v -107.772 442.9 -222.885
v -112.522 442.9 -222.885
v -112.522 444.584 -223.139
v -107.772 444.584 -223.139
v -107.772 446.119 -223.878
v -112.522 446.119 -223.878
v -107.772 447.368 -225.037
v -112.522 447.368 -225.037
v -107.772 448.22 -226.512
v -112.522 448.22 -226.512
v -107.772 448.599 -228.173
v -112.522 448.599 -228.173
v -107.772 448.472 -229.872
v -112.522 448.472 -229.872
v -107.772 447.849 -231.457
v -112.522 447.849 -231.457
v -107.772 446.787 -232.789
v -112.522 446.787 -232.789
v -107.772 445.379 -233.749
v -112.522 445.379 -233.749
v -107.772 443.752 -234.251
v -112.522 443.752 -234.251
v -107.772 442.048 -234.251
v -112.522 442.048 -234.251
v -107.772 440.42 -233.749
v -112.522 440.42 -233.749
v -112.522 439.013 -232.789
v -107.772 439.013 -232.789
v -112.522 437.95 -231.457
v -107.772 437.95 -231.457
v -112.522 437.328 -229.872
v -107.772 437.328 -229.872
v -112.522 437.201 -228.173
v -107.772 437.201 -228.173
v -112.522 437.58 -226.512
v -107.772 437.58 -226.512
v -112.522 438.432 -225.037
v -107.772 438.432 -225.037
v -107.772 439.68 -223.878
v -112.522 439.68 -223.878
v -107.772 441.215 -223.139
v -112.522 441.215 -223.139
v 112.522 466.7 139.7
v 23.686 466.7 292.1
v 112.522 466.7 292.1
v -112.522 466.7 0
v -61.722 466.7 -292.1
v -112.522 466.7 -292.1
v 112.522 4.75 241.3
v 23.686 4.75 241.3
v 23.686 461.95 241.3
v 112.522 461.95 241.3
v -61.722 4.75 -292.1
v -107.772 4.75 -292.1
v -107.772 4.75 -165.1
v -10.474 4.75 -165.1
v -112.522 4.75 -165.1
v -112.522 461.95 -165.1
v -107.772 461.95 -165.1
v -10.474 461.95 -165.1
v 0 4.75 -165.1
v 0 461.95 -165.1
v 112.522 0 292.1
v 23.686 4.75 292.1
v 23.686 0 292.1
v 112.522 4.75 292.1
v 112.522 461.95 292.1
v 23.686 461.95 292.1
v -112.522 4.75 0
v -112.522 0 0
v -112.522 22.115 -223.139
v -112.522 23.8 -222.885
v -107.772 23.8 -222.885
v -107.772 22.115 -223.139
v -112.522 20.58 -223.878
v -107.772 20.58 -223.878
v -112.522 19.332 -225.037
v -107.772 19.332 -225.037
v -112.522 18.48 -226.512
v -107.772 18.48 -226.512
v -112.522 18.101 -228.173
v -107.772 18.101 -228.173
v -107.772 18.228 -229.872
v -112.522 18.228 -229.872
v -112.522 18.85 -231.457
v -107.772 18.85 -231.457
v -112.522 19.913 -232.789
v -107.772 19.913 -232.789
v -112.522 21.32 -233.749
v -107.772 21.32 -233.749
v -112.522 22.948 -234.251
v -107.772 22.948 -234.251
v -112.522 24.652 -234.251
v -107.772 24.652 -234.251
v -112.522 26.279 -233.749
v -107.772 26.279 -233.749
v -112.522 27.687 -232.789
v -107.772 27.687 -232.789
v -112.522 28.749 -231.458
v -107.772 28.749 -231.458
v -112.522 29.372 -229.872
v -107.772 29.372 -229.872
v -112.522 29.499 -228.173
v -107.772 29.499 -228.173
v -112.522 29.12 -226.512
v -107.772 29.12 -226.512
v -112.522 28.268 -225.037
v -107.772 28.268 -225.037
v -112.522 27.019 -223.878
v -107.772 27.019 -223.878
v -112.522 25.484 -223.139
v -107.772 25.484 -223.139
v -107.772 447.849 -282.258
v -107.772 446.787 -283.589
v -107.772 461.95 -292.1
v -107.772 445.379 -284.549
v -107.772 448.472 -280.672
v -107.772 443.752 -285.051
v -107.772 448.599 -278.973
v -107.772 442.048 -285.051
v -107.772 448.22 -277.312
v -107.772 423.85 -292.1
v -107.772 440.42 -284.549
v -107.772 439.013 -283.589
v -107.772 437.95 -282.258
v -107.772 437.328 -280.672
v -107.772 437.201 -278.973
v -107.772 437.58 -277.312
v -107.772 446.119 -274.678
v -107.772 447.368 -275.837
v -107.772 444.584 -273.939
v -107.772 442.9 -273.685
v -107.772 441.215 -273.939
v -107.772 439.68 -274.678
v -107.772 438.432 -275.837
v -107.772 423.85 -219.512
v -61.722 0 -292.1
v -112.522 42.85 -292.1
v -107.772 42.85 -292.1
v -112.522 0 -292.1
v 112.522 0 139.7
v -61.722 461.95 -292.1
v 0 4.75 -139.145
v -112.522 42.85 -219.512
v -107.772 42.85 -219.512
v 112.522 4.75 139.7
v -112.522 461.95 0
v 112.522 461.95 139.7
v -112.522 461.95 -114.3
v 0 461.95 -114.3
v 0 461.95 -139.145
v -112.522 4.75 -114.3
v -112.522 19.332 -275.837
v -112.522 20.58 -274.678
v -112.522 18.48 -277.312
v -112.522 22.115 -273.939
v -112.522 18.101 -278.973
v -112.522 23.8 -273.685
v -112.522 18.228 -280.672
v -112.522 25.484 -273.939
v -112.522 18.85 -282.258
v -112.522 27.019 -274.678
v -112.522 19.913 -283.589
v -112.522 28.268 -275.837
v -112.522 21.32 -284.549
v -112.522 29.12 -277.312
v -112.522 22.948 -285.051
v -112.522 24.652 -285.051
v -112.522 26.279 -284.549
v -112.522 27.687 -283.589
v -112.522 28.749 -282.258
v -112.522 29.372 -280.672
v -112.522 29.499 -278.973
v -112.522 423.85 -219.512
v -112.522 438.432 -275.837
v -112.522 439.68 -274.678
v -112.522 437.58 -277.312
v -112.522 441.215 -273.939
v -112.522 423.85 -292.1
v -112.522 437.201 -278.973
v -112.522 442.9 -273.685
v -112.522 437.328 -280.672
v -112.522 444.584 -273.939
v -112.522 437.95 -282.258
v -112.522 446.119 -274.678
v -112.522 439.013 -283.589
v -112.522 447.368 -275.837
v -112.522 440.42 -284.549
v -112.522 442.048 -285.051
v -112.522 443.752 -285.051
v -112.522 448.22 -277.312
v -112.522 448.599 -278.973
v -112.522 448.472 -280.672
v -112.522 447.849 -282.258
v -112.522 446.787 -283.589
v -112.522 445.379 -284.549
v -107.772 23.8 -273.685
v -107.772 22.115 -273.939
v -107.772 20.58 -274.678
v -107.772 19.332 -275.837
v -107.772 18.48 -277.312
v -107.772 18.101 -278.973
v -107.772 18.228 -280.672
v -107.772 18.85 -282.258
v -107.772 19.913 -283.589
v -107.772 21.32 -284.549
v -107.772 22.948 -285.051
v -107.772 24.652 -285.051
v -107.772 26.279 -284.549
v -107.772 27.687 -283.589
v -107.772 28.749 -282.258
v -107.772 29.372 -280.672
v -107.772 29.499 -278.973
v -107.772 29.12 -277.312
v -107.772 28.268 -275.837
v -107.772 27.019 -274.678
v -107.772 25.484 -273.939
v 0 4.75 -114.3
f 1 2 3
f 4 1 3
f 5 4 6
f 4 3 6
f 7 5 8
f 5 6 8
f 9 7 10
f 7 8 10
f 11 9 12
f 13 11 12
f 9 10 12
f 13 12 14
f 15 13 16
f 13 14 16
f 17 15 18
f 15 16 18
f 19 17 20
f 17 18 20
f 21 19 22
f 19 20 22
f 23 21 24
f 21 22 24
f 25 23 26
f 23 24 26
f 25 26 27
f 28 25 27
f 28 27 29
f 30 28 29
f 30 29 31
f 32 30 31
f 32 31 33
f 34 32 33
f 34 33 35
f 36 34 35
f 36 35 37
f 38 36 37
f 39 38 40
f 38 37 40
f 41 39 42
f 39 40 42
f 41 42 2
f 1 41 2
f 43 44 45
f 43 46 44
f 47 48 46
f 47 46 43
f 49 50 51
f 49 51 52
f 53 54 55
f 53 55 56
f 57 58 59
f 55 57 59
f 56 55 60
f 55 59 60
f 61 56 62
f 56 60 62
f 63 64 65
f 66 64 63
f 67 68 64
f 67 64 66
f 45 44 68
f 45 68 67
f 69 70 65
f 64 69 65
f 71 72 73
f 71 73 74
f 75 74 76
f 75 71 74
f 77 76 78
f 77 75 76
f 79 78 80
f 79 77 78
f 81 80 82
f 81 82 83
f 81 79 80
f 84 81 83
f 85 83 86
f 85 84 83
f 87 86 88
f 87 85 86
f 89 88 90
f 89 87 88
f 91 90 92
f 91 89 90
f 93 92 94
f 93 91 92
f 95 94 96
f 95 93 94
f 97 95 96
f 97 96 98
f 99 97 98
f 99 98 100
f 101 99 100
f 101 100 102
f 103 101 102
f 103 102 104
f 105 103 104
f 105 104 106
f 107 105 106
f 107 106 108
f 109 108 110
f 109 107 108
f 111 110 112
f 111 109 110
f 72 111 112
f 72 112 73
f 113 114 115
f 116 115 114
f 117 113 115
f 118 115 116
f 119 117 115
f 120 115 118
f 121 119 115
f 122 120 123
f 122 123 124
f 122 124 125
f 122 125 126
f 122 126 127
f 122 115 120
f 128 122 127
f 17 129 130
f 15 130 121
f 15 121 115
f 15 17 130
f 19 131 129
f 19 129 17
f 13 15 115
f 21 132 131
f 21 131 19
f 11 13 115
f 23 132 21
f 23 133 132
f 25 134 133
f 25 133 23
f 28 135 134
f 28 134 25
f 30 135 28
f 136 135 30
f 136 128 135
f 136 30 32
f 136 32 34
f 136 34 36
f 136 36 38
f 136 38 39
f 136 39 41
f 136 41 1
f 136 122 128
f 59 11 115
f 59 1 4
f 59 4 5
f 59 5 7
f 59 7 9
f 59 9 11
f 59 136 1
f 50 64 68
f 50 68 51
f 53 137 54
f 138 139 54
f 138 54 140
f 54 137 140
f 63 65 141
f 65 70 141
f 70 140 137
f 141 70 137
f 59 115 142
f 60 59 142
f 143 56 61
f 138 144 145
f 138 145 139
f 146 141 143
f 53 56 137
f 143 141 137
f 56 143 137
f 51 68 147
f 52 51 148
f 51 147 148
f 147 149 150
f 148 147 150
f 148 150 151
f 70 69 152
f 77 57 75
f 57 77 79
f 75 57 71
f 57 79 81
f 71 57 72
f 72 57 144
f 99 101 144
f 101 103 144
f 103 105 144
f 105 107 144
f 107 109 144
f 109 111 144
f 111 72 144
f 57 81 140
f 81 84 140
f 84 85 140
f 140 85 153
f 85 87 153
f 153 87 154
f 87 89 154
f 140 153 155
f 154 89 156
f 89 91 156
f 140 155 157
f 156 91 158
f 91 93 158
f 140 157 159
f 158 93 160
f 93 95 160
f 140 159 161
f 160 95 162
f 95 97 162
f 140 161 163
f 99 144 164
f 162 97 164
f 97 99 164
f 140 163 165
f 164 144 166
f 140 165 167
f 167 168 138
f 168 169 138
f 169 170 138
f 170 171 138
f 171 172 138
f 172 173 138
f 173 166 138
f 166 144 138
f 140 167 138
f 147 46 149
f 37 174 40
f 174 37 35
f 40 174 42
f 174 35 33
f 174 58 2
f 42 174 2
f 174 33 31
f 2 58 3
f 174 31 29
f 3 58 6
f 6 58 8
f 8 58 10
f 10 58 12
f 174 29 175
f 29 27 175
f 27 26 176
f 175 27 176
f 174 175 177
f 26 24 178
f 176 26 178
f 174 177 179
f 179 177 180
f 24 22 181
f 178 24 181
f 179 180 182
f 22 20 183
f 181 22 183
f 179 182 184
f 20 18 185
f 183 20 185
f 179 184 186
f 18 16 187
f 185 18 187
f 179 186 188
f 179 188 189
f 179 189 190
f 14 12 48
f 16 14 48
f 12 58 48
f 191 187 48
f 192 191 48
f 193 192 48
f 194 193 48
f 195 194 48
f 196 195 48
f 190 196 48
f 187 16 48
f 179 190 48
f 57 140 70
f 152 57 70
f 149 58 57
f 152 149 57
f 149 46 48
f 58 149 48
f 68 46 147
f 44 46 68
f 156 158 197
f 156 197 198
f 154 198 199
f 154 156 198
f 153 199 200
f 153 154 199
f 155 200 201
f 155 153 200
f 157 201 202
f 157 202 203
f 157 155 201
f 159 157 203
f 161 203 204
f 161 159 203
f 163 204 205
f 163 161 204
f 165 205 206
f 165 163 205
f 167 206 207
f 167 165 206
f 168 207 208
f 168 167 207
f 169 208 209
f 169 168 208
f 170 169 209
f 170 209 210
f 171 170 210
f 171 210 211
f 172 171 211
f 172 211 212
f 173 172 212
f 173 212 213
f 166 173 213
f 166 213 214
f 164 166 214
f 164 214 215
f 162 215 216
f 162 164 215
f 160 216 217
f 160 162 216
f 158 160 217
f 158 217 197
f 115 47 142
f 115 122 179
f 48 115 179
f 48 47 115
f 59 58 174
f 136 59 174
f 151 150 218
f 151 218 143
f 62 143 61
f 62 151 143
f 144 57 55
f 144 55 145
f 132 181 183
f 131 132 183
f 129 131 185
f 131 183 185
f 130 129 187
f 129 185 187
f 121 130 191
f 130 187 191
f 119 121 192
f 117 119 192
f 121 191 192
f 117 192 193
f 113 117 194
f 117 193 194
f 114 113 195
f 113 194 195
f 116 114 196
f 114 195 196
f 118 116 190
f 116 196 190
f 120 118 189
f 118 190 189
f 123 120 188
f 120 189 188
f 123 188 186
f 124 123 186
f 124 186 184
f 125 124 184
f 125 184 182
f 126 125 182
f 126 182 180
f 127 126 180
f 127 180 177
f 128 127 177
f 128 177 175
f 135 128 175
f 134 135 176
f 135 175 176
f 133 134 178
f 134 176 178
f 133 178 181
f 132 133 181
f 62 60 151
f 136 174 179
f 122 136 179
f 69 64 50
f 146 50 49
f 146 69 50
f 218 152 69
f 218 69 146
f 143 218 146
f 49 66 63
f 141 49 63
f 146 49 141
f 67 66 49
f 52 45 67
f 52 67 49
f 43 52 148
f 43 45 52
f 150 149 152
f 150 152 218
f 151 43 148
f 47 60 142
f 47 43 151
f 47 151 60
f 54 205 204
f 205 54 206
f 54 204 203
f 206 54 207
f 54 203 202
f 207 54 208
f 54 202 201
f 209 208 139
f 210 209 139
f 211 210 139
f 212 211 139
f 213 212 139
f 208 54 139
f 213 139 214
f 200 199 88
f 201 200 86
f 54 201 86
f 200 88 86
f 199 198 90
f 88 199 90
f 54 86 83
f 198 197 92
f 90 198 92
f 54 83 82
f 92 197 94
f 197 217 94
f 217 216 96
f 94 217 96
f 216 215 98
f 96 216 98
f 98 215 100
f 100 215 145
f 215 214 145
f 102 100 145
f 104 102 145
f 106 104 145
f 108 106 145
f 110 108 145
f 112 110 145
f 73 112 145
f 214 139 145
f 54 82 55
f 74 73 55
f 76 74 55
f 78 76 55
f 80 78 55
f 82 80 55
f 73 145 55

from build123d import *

# Parameters (mm, degrees)
BOSS_EXTRUDE1_DEPTH = 4.7498
SKETCH2_R           = 5.715
BOSS_EXTRUDE2_DEPTH = 4.7498
SKETCH3_W           = 112.522
SKETCH3_H           = 50.8
SKETCH3_W_2         = 88.835533053
BOSS_EXTRUDE3_DEPTH = 228.6


with BuildPart() as part:
    # Sketch1 → Boss-Extrude1 (new body)
    with BuildSketch(Plane(origin=(0, 0, 0), x_dir=(1, 0, 0), z_dir=(0, 1, 0))):
        Polygon((23.686466947, -292.1), (112.522, -292.1), (112.522, -139.7), (-61.722, 292.1), (-112.522, 292.1), (-112.522, 0), align=None)
    extrude(amount=BOSS_EXTRUDE1_DEPTH)



with BuildPart() as body_2:
    # Sketch2 → Boss-Extrude2 (new body)
    with BuildSketch(Plane(origin=(-112.522, 0, 11.737401462), x_dir=(0, 0, -1), z_dir=(1, 0, 0))):
        Polygon((176.837401462, 4.7498), (231.249840519, 42.8498), (303.837401462, 42.8498), (303.837401462, 4.7498), align=None)
        with Locations(Location((291.137401462, 23.7998, 0), (0, 0, 180))):
            Circle(SKETCH2_R, mode=Mode.SUBTRACT)
        with Locations(Location((240.337401462, 23.7998, 0), (0, 0, 180))):
            Circle(SKETCH2_R, mode=Mode.SUBTRACT)
    extrude(amount=BOSS_EXTRUDE2_DEPTH)


with BuildPart() as part_1:
    add(part.part)

    add(body_2.part)  # Boss-Extrude3 merges body 2
    # Sketch3 → Boss-Extrude3 (add)
    with BuildSketch(Plane(origin=(0, 4.7498, 0), x_dir=(1, 0, 0), z_dir=(0, 1, 0))):
        with Locations((-56.261, 139.7)):
            Rectangle(SKETCH3_W, SKETCH3_H)
        with Locations((68.104233474, -266.7)):
            Rectangle(SKETCH3_W_2, SKETCH3_H)
    extrude(amount=BOSS_EXTRUDE3_DEPTH)

    # Mirror1: part across plane


with BuildPart() as part_2:
    add(part_1.part)
    add(part_1.part.mirror(Plane.ZX.offset(233.3498)))


solid = part_2.part
